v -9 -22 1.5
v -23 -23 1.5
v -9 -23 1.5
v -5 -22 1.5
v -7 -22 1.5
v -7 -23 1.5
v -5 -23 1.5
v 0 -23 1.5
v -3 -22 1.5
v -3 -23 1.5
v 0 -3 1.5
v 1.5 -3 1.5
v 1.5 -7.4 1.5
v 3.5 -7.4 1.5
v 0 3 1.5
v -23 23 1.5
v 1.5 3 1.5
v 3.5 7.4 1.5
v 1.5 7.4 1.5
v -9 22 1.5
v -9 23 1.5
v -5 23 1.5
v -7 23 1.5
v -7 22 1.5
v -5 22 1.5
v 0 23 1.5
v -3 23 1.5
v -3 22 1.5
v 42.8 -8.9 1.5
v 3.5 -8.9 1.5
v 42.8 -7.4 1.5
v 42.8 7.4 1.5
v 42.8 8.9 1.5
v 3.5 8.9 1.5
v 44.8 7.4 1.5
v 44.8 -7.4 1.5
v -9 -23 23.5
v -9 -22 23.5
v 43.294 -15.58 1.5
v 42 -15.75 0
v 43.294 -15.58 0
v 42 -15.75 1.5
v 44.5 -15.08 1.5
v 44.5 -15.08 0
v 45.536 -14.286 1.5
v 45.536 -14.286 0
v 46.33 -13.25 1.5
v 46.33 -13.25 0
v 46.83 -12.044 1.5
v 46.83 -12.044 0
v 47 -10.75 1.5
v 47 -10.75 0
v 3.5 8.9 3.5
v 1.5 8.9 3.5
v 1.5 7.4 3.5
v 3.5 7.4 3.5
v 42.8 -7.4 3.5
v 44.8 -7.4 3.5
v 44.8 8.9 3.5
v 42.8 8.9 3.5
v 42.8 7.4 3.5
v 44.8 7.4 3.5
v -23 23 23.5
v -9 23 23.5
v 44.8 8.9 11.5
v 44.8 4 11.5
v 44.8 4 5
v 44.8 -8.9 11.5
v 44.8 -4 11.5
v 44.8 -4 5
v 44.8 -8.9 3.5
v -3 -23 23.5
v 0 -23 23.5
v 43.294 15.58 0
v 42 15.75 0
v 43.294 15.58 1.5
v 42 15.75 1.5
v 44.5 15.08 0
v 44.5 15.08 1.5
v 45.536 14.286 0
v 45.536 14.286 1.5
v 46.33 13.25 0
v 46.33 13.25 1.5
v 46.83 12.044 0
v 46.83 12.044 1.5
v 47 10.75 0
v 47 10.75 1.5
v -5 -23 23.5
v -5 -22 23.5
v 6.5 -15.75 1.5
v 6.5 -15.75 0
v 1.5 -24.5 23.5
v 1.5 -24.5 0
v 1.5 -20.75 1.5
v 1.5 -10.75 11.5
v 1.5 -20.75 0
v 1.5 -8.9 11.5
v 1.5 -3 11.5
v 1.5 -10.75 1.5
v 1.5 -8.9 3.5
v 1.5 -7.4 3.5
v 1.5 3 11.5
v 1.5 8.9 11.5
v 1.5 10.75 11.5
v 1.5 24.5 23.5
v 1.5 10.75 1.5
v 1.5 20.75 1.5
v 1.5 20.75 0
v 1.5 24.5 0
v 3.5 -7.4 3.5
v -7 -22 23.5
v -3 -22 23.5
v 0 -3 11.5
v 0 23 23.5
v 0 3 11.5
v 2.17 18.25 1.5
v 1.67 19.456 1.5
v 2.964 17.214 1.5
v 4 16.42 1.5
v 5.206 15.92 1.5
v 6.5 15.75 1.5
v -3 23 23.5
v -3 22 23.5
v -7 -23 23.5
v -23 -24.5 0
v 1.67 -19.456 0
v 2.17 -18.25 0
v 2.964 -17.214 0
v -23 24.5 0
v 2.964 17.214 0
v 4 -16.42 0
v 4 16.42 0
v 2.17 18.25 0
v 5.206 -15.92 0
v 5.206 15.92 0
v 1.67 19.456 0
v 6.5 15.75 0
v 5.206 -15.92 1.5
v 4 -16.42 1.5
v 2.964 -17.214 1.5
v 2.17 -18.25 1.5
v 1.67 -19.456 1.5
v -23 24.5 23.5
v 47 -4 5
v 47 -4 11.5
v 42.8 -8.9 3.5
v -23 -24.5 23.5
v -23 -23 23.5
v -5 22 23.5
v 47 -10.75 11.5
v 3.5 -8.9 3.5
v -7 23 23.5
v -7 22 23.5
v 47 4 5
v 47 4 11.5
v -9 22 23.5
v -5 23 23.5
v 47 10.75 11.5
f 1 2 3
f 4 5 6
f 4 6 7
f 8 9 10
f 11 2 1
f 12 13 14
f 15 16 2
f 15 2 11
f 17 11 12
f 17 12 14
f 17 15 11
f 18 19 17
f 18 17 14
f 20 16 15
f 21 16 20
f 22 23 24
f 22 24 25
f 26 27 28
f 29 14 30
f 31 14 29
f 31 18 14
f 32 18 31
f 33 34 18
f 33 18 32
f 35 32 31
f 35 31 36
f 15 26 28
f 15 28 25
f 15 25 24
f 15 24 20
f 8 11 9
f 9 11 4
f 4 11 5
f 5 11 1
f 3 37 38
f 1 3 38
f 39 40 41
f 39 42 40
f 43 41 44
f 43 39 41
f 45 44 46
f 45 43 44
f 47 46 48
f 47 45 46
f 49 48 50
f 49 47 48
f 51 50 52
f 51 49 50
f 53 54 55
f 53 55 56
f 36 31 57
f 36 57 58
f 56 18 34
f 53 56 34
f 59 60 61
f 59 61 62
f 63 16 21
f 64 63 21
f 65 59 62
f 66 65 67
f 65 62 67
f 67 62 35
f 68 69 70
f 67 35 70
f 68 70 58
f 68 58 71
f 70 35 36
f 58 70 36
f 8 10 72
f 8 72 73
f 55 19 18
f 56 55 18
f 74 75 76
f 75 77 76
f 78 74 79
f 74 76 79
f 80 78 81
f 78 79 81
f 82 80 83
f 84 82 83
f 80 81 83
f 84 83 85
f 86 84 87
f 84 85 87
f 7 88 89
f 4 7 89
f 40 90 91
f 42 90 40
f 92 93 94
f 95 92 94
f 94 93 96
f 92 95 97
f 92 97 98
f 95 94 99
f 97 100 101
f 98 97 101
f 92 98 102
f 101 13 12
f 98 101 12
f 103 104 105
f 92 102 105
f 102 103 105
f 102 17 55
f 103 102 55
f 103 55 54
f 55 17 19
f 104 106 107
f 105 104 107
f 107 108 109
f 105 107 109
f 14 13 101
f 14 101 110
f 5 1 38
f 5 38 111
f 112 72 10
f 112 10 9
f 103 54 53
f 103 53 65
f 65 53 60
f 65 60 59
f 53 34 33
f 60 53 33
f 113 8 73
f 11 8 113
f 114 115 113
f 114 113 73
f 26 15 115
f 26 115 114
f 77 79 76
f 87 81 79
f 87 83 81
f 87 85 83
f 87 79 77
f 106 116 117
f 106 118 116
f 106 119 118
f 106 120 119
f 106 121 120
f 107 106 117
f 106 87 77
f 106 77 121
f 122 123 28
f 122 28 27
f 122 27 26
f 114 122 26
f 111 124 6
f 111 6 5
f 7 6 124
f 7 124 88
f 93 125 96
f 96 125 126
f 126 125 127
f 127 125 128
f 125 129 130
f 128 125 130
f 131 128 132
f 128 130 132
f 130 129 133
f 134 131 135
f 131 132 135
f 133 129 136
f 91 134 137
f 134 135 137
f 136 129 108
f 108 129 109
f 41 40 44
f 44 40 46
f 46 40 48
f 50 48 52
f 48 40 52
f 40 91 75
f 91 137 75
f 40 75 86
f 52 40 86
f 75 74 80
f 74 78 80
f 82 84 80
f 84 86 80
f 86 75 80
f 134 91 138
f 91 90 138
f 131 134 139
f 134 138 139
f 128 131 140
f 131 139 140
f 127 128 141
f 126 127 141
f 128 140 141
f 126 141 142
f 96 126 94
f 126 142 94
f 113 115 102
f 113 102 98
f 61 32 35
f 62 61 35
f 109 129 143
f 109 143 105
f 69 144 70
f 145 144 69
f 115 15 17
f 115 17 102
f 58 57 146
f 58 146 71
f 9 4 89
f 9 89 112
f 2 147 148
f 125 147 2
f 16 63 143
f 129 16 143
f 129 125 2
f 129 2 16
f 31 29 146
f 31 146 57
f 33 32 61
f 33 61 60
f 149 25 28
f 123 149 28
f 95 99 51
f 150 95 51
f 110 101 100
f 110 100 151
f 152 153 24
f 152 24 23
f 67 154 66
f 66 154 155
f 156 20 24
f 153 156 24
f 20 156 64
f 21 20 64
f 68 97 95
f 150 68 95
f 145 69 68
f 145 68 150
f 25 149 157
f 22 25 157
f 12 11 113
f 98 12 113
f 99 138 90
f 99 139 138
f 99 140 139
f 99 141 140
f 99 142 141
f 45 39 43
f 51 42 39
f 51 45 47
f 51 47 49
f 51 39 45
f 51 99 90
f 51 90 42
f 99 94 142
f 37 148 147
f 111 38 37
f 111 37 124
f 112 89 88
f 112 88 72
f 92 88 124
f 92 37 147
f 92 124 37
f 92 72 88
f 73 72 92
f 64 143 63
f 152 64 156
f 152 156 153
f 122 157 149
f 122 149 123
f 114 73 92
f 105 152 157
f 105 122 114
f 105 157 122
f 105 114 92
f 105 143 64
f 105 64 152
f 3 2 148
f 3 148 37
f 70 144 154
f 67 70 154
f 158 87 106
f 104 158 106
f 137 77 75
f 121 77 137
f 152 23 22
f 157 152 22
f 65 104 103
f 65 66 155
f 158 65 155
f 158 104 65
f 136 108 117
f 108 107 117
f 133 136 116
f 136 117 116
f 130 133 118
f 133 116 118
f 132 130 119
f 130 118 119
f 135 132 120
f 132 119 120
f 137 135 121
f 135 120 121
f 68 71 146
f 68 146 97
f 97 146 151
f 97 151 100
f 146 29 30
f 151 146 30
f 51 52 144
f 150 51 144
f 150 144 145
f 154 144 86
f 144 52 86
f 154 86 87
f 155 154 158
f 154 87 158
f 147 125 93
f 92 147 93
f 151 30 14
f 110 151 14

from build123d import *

# Parameters (mm, degrees)
F0_W      = 23
F0_H      = 49
F1_DEPTH  = 1.5
F2_W      = 23
F2_H      = 1.5
F3_DEPTH  = 22
F4_W      = 2
F4_H      = 1
F5_DEPTH  = 22
F6_W      = 47
F6_H      = 21.5
F7_DEPTH  = 1.5
F8_W      = 1.5
F8_H      = 49
F9_DEPTH  = 23.5
F11_DEPTH = 10
F12_W     = 6
F12_H     = 10
F13_DEPTH = 1.5
F14_W     = 2
F14_H     = 1.5
F15_DEPTH = 2
F16_W     = 8
F16_H     = 6.5
F17_DEPTH = 2.2
F18_W     = 45.5
F18_H     = 1.5
F19_DEPTH = 5
F20_W     = 45.5
F20_H     = 1.5
F21_DEPTH = 5
F22_R     = 5


with BuildPart() as f1:
    # F0 (on Top) → F1 (new body)
    with BuildSketch(Plane.XY):
        with Locations((-11.5, 0)):
            Rectangle(F0_W, F0_H)
    extrude(amount=F1_DEPTH)

    # F2 (on face) → F3 (join)
    with BuildSketch(Plane.XY.offset(1.5)):
        with Locations((-11.5, 23.75)):
            Rectangle(F2_W, F2_H)
        with Locations((-11.5, -23.75)):
            Rectangle(F2_W, F2_H)
    extrude(amount=F3_DEPTH)

    # F4 (on face) → F5 (join)
    with BuildSketch(Plane.XY.offset(1.5)):
        with Locations((-4, 22.5)):
            Rectangle(F4_W, F4_H)
        with Locations((-8, -22.5)):
            Rectangle(F4_W, F4_H)
        with Locations((-4, -22.5)):
            Rectangle(F4_W, F4_H)
        with Locations((-8, 22.5)):
            Rectangle(F4_W, F4_H)
    extrude(amount=F5_DEPTH)

    # F6 (on Top) → F7 (join)
    with BuildSketch(Plane.XY):
        with Locations((23.5, 0)):
            Rectangle(F6_W, F6_H)
    extrude(amount=F7_DEPTH)

    # F8 (on Top) → F9 (join)
    with BuildSketch(Plane.XY):
        with Locations((0.75, 0)):
            Rectangle(F8_W, F8_H)
    extrude(amount=F9_DEPTH)

    # F10 (on face) → F11 (join)
    with BuildSketch(Plane.XY.offset(1.5)):
        Polygon((1.5, 10.75), (1.5, 8.9), (44.8, 8.9), (44.8, -8.9), (1.5, -8.9), (1.5, -10.75), (47, -10.75), (47, 10.75), align=None)
    extrude(amount=F11_DEPTH)

    # F12 (on face) → F13 (cut, through all)
    with BuildSketch(Plane(origin=(0, 0, 0), x_dir=(0, -1, 0), z_dir=(-1, 0, 0))):
        with Locations((0, 6.5)):
            Rectangle(F12_W, F12_H)
    extrude(amount=-F13_DEPTH, mode=Mode.SUBTRACT)

    # F14 (on face) → F15 (join)
    with BuildSketch(Plane.XY.offset(1.5)):
        with Locations((2.5, 8.15)):
            Rectangle(F14_W, F14_H)
        with Locations((2.5, -8.15)):
            Rectangle(F14_W, F14_H)
        with Locations((43.8, 8.15)):
            Rectangle(F14_W, F14_H)
        with Locations((43.8, -8.15)):
            Rectangle(F14_W, F14_H)
    extrude(amount=F15_DEPTH)

    # F16 (on face) → F17 (cut, through all)
    with BuildSketch(Plane.YZ.offset(47)):
        with Locations((0, 8.25)):
            Rectangle(F16_W, F16_H)
    extrude(amount=-F17_DEPTH, mode=Mode.SUBTRACT)

    # F18 (on face) → F19 (join)
    with BuildSketch(Plane(origin=(0, 10.75, 0), x_dir=(-1, 0, 0), z_dir=(0, 1, 0))):
        with Locations((-24.25, 0.75)):
            Rectangle(F18_W, F18_H)
    extrude(amount=F19_DEPTH)

    # F20 (on face) → F21 (join)
    with BuildSketch(Plane.XZ.offset(10.75)):
        with Locations((24.25, 0.75)):
            Rectangle(F20_W, F20_H)
    extrude(amount=F21_DEPTH)

    # F22
    f22_edges = [f1.edges().sort_by_distance(p)[0] for p in [
        (47, 15.75, 0.75),
        (1.5, 15.75, 0.75),
        (47, -15.75, 0.75),
        (1.5, -15.75, 0.75),
    ]]
    fillet(f22_edges, radius=F22_R)


solid = f1.part
